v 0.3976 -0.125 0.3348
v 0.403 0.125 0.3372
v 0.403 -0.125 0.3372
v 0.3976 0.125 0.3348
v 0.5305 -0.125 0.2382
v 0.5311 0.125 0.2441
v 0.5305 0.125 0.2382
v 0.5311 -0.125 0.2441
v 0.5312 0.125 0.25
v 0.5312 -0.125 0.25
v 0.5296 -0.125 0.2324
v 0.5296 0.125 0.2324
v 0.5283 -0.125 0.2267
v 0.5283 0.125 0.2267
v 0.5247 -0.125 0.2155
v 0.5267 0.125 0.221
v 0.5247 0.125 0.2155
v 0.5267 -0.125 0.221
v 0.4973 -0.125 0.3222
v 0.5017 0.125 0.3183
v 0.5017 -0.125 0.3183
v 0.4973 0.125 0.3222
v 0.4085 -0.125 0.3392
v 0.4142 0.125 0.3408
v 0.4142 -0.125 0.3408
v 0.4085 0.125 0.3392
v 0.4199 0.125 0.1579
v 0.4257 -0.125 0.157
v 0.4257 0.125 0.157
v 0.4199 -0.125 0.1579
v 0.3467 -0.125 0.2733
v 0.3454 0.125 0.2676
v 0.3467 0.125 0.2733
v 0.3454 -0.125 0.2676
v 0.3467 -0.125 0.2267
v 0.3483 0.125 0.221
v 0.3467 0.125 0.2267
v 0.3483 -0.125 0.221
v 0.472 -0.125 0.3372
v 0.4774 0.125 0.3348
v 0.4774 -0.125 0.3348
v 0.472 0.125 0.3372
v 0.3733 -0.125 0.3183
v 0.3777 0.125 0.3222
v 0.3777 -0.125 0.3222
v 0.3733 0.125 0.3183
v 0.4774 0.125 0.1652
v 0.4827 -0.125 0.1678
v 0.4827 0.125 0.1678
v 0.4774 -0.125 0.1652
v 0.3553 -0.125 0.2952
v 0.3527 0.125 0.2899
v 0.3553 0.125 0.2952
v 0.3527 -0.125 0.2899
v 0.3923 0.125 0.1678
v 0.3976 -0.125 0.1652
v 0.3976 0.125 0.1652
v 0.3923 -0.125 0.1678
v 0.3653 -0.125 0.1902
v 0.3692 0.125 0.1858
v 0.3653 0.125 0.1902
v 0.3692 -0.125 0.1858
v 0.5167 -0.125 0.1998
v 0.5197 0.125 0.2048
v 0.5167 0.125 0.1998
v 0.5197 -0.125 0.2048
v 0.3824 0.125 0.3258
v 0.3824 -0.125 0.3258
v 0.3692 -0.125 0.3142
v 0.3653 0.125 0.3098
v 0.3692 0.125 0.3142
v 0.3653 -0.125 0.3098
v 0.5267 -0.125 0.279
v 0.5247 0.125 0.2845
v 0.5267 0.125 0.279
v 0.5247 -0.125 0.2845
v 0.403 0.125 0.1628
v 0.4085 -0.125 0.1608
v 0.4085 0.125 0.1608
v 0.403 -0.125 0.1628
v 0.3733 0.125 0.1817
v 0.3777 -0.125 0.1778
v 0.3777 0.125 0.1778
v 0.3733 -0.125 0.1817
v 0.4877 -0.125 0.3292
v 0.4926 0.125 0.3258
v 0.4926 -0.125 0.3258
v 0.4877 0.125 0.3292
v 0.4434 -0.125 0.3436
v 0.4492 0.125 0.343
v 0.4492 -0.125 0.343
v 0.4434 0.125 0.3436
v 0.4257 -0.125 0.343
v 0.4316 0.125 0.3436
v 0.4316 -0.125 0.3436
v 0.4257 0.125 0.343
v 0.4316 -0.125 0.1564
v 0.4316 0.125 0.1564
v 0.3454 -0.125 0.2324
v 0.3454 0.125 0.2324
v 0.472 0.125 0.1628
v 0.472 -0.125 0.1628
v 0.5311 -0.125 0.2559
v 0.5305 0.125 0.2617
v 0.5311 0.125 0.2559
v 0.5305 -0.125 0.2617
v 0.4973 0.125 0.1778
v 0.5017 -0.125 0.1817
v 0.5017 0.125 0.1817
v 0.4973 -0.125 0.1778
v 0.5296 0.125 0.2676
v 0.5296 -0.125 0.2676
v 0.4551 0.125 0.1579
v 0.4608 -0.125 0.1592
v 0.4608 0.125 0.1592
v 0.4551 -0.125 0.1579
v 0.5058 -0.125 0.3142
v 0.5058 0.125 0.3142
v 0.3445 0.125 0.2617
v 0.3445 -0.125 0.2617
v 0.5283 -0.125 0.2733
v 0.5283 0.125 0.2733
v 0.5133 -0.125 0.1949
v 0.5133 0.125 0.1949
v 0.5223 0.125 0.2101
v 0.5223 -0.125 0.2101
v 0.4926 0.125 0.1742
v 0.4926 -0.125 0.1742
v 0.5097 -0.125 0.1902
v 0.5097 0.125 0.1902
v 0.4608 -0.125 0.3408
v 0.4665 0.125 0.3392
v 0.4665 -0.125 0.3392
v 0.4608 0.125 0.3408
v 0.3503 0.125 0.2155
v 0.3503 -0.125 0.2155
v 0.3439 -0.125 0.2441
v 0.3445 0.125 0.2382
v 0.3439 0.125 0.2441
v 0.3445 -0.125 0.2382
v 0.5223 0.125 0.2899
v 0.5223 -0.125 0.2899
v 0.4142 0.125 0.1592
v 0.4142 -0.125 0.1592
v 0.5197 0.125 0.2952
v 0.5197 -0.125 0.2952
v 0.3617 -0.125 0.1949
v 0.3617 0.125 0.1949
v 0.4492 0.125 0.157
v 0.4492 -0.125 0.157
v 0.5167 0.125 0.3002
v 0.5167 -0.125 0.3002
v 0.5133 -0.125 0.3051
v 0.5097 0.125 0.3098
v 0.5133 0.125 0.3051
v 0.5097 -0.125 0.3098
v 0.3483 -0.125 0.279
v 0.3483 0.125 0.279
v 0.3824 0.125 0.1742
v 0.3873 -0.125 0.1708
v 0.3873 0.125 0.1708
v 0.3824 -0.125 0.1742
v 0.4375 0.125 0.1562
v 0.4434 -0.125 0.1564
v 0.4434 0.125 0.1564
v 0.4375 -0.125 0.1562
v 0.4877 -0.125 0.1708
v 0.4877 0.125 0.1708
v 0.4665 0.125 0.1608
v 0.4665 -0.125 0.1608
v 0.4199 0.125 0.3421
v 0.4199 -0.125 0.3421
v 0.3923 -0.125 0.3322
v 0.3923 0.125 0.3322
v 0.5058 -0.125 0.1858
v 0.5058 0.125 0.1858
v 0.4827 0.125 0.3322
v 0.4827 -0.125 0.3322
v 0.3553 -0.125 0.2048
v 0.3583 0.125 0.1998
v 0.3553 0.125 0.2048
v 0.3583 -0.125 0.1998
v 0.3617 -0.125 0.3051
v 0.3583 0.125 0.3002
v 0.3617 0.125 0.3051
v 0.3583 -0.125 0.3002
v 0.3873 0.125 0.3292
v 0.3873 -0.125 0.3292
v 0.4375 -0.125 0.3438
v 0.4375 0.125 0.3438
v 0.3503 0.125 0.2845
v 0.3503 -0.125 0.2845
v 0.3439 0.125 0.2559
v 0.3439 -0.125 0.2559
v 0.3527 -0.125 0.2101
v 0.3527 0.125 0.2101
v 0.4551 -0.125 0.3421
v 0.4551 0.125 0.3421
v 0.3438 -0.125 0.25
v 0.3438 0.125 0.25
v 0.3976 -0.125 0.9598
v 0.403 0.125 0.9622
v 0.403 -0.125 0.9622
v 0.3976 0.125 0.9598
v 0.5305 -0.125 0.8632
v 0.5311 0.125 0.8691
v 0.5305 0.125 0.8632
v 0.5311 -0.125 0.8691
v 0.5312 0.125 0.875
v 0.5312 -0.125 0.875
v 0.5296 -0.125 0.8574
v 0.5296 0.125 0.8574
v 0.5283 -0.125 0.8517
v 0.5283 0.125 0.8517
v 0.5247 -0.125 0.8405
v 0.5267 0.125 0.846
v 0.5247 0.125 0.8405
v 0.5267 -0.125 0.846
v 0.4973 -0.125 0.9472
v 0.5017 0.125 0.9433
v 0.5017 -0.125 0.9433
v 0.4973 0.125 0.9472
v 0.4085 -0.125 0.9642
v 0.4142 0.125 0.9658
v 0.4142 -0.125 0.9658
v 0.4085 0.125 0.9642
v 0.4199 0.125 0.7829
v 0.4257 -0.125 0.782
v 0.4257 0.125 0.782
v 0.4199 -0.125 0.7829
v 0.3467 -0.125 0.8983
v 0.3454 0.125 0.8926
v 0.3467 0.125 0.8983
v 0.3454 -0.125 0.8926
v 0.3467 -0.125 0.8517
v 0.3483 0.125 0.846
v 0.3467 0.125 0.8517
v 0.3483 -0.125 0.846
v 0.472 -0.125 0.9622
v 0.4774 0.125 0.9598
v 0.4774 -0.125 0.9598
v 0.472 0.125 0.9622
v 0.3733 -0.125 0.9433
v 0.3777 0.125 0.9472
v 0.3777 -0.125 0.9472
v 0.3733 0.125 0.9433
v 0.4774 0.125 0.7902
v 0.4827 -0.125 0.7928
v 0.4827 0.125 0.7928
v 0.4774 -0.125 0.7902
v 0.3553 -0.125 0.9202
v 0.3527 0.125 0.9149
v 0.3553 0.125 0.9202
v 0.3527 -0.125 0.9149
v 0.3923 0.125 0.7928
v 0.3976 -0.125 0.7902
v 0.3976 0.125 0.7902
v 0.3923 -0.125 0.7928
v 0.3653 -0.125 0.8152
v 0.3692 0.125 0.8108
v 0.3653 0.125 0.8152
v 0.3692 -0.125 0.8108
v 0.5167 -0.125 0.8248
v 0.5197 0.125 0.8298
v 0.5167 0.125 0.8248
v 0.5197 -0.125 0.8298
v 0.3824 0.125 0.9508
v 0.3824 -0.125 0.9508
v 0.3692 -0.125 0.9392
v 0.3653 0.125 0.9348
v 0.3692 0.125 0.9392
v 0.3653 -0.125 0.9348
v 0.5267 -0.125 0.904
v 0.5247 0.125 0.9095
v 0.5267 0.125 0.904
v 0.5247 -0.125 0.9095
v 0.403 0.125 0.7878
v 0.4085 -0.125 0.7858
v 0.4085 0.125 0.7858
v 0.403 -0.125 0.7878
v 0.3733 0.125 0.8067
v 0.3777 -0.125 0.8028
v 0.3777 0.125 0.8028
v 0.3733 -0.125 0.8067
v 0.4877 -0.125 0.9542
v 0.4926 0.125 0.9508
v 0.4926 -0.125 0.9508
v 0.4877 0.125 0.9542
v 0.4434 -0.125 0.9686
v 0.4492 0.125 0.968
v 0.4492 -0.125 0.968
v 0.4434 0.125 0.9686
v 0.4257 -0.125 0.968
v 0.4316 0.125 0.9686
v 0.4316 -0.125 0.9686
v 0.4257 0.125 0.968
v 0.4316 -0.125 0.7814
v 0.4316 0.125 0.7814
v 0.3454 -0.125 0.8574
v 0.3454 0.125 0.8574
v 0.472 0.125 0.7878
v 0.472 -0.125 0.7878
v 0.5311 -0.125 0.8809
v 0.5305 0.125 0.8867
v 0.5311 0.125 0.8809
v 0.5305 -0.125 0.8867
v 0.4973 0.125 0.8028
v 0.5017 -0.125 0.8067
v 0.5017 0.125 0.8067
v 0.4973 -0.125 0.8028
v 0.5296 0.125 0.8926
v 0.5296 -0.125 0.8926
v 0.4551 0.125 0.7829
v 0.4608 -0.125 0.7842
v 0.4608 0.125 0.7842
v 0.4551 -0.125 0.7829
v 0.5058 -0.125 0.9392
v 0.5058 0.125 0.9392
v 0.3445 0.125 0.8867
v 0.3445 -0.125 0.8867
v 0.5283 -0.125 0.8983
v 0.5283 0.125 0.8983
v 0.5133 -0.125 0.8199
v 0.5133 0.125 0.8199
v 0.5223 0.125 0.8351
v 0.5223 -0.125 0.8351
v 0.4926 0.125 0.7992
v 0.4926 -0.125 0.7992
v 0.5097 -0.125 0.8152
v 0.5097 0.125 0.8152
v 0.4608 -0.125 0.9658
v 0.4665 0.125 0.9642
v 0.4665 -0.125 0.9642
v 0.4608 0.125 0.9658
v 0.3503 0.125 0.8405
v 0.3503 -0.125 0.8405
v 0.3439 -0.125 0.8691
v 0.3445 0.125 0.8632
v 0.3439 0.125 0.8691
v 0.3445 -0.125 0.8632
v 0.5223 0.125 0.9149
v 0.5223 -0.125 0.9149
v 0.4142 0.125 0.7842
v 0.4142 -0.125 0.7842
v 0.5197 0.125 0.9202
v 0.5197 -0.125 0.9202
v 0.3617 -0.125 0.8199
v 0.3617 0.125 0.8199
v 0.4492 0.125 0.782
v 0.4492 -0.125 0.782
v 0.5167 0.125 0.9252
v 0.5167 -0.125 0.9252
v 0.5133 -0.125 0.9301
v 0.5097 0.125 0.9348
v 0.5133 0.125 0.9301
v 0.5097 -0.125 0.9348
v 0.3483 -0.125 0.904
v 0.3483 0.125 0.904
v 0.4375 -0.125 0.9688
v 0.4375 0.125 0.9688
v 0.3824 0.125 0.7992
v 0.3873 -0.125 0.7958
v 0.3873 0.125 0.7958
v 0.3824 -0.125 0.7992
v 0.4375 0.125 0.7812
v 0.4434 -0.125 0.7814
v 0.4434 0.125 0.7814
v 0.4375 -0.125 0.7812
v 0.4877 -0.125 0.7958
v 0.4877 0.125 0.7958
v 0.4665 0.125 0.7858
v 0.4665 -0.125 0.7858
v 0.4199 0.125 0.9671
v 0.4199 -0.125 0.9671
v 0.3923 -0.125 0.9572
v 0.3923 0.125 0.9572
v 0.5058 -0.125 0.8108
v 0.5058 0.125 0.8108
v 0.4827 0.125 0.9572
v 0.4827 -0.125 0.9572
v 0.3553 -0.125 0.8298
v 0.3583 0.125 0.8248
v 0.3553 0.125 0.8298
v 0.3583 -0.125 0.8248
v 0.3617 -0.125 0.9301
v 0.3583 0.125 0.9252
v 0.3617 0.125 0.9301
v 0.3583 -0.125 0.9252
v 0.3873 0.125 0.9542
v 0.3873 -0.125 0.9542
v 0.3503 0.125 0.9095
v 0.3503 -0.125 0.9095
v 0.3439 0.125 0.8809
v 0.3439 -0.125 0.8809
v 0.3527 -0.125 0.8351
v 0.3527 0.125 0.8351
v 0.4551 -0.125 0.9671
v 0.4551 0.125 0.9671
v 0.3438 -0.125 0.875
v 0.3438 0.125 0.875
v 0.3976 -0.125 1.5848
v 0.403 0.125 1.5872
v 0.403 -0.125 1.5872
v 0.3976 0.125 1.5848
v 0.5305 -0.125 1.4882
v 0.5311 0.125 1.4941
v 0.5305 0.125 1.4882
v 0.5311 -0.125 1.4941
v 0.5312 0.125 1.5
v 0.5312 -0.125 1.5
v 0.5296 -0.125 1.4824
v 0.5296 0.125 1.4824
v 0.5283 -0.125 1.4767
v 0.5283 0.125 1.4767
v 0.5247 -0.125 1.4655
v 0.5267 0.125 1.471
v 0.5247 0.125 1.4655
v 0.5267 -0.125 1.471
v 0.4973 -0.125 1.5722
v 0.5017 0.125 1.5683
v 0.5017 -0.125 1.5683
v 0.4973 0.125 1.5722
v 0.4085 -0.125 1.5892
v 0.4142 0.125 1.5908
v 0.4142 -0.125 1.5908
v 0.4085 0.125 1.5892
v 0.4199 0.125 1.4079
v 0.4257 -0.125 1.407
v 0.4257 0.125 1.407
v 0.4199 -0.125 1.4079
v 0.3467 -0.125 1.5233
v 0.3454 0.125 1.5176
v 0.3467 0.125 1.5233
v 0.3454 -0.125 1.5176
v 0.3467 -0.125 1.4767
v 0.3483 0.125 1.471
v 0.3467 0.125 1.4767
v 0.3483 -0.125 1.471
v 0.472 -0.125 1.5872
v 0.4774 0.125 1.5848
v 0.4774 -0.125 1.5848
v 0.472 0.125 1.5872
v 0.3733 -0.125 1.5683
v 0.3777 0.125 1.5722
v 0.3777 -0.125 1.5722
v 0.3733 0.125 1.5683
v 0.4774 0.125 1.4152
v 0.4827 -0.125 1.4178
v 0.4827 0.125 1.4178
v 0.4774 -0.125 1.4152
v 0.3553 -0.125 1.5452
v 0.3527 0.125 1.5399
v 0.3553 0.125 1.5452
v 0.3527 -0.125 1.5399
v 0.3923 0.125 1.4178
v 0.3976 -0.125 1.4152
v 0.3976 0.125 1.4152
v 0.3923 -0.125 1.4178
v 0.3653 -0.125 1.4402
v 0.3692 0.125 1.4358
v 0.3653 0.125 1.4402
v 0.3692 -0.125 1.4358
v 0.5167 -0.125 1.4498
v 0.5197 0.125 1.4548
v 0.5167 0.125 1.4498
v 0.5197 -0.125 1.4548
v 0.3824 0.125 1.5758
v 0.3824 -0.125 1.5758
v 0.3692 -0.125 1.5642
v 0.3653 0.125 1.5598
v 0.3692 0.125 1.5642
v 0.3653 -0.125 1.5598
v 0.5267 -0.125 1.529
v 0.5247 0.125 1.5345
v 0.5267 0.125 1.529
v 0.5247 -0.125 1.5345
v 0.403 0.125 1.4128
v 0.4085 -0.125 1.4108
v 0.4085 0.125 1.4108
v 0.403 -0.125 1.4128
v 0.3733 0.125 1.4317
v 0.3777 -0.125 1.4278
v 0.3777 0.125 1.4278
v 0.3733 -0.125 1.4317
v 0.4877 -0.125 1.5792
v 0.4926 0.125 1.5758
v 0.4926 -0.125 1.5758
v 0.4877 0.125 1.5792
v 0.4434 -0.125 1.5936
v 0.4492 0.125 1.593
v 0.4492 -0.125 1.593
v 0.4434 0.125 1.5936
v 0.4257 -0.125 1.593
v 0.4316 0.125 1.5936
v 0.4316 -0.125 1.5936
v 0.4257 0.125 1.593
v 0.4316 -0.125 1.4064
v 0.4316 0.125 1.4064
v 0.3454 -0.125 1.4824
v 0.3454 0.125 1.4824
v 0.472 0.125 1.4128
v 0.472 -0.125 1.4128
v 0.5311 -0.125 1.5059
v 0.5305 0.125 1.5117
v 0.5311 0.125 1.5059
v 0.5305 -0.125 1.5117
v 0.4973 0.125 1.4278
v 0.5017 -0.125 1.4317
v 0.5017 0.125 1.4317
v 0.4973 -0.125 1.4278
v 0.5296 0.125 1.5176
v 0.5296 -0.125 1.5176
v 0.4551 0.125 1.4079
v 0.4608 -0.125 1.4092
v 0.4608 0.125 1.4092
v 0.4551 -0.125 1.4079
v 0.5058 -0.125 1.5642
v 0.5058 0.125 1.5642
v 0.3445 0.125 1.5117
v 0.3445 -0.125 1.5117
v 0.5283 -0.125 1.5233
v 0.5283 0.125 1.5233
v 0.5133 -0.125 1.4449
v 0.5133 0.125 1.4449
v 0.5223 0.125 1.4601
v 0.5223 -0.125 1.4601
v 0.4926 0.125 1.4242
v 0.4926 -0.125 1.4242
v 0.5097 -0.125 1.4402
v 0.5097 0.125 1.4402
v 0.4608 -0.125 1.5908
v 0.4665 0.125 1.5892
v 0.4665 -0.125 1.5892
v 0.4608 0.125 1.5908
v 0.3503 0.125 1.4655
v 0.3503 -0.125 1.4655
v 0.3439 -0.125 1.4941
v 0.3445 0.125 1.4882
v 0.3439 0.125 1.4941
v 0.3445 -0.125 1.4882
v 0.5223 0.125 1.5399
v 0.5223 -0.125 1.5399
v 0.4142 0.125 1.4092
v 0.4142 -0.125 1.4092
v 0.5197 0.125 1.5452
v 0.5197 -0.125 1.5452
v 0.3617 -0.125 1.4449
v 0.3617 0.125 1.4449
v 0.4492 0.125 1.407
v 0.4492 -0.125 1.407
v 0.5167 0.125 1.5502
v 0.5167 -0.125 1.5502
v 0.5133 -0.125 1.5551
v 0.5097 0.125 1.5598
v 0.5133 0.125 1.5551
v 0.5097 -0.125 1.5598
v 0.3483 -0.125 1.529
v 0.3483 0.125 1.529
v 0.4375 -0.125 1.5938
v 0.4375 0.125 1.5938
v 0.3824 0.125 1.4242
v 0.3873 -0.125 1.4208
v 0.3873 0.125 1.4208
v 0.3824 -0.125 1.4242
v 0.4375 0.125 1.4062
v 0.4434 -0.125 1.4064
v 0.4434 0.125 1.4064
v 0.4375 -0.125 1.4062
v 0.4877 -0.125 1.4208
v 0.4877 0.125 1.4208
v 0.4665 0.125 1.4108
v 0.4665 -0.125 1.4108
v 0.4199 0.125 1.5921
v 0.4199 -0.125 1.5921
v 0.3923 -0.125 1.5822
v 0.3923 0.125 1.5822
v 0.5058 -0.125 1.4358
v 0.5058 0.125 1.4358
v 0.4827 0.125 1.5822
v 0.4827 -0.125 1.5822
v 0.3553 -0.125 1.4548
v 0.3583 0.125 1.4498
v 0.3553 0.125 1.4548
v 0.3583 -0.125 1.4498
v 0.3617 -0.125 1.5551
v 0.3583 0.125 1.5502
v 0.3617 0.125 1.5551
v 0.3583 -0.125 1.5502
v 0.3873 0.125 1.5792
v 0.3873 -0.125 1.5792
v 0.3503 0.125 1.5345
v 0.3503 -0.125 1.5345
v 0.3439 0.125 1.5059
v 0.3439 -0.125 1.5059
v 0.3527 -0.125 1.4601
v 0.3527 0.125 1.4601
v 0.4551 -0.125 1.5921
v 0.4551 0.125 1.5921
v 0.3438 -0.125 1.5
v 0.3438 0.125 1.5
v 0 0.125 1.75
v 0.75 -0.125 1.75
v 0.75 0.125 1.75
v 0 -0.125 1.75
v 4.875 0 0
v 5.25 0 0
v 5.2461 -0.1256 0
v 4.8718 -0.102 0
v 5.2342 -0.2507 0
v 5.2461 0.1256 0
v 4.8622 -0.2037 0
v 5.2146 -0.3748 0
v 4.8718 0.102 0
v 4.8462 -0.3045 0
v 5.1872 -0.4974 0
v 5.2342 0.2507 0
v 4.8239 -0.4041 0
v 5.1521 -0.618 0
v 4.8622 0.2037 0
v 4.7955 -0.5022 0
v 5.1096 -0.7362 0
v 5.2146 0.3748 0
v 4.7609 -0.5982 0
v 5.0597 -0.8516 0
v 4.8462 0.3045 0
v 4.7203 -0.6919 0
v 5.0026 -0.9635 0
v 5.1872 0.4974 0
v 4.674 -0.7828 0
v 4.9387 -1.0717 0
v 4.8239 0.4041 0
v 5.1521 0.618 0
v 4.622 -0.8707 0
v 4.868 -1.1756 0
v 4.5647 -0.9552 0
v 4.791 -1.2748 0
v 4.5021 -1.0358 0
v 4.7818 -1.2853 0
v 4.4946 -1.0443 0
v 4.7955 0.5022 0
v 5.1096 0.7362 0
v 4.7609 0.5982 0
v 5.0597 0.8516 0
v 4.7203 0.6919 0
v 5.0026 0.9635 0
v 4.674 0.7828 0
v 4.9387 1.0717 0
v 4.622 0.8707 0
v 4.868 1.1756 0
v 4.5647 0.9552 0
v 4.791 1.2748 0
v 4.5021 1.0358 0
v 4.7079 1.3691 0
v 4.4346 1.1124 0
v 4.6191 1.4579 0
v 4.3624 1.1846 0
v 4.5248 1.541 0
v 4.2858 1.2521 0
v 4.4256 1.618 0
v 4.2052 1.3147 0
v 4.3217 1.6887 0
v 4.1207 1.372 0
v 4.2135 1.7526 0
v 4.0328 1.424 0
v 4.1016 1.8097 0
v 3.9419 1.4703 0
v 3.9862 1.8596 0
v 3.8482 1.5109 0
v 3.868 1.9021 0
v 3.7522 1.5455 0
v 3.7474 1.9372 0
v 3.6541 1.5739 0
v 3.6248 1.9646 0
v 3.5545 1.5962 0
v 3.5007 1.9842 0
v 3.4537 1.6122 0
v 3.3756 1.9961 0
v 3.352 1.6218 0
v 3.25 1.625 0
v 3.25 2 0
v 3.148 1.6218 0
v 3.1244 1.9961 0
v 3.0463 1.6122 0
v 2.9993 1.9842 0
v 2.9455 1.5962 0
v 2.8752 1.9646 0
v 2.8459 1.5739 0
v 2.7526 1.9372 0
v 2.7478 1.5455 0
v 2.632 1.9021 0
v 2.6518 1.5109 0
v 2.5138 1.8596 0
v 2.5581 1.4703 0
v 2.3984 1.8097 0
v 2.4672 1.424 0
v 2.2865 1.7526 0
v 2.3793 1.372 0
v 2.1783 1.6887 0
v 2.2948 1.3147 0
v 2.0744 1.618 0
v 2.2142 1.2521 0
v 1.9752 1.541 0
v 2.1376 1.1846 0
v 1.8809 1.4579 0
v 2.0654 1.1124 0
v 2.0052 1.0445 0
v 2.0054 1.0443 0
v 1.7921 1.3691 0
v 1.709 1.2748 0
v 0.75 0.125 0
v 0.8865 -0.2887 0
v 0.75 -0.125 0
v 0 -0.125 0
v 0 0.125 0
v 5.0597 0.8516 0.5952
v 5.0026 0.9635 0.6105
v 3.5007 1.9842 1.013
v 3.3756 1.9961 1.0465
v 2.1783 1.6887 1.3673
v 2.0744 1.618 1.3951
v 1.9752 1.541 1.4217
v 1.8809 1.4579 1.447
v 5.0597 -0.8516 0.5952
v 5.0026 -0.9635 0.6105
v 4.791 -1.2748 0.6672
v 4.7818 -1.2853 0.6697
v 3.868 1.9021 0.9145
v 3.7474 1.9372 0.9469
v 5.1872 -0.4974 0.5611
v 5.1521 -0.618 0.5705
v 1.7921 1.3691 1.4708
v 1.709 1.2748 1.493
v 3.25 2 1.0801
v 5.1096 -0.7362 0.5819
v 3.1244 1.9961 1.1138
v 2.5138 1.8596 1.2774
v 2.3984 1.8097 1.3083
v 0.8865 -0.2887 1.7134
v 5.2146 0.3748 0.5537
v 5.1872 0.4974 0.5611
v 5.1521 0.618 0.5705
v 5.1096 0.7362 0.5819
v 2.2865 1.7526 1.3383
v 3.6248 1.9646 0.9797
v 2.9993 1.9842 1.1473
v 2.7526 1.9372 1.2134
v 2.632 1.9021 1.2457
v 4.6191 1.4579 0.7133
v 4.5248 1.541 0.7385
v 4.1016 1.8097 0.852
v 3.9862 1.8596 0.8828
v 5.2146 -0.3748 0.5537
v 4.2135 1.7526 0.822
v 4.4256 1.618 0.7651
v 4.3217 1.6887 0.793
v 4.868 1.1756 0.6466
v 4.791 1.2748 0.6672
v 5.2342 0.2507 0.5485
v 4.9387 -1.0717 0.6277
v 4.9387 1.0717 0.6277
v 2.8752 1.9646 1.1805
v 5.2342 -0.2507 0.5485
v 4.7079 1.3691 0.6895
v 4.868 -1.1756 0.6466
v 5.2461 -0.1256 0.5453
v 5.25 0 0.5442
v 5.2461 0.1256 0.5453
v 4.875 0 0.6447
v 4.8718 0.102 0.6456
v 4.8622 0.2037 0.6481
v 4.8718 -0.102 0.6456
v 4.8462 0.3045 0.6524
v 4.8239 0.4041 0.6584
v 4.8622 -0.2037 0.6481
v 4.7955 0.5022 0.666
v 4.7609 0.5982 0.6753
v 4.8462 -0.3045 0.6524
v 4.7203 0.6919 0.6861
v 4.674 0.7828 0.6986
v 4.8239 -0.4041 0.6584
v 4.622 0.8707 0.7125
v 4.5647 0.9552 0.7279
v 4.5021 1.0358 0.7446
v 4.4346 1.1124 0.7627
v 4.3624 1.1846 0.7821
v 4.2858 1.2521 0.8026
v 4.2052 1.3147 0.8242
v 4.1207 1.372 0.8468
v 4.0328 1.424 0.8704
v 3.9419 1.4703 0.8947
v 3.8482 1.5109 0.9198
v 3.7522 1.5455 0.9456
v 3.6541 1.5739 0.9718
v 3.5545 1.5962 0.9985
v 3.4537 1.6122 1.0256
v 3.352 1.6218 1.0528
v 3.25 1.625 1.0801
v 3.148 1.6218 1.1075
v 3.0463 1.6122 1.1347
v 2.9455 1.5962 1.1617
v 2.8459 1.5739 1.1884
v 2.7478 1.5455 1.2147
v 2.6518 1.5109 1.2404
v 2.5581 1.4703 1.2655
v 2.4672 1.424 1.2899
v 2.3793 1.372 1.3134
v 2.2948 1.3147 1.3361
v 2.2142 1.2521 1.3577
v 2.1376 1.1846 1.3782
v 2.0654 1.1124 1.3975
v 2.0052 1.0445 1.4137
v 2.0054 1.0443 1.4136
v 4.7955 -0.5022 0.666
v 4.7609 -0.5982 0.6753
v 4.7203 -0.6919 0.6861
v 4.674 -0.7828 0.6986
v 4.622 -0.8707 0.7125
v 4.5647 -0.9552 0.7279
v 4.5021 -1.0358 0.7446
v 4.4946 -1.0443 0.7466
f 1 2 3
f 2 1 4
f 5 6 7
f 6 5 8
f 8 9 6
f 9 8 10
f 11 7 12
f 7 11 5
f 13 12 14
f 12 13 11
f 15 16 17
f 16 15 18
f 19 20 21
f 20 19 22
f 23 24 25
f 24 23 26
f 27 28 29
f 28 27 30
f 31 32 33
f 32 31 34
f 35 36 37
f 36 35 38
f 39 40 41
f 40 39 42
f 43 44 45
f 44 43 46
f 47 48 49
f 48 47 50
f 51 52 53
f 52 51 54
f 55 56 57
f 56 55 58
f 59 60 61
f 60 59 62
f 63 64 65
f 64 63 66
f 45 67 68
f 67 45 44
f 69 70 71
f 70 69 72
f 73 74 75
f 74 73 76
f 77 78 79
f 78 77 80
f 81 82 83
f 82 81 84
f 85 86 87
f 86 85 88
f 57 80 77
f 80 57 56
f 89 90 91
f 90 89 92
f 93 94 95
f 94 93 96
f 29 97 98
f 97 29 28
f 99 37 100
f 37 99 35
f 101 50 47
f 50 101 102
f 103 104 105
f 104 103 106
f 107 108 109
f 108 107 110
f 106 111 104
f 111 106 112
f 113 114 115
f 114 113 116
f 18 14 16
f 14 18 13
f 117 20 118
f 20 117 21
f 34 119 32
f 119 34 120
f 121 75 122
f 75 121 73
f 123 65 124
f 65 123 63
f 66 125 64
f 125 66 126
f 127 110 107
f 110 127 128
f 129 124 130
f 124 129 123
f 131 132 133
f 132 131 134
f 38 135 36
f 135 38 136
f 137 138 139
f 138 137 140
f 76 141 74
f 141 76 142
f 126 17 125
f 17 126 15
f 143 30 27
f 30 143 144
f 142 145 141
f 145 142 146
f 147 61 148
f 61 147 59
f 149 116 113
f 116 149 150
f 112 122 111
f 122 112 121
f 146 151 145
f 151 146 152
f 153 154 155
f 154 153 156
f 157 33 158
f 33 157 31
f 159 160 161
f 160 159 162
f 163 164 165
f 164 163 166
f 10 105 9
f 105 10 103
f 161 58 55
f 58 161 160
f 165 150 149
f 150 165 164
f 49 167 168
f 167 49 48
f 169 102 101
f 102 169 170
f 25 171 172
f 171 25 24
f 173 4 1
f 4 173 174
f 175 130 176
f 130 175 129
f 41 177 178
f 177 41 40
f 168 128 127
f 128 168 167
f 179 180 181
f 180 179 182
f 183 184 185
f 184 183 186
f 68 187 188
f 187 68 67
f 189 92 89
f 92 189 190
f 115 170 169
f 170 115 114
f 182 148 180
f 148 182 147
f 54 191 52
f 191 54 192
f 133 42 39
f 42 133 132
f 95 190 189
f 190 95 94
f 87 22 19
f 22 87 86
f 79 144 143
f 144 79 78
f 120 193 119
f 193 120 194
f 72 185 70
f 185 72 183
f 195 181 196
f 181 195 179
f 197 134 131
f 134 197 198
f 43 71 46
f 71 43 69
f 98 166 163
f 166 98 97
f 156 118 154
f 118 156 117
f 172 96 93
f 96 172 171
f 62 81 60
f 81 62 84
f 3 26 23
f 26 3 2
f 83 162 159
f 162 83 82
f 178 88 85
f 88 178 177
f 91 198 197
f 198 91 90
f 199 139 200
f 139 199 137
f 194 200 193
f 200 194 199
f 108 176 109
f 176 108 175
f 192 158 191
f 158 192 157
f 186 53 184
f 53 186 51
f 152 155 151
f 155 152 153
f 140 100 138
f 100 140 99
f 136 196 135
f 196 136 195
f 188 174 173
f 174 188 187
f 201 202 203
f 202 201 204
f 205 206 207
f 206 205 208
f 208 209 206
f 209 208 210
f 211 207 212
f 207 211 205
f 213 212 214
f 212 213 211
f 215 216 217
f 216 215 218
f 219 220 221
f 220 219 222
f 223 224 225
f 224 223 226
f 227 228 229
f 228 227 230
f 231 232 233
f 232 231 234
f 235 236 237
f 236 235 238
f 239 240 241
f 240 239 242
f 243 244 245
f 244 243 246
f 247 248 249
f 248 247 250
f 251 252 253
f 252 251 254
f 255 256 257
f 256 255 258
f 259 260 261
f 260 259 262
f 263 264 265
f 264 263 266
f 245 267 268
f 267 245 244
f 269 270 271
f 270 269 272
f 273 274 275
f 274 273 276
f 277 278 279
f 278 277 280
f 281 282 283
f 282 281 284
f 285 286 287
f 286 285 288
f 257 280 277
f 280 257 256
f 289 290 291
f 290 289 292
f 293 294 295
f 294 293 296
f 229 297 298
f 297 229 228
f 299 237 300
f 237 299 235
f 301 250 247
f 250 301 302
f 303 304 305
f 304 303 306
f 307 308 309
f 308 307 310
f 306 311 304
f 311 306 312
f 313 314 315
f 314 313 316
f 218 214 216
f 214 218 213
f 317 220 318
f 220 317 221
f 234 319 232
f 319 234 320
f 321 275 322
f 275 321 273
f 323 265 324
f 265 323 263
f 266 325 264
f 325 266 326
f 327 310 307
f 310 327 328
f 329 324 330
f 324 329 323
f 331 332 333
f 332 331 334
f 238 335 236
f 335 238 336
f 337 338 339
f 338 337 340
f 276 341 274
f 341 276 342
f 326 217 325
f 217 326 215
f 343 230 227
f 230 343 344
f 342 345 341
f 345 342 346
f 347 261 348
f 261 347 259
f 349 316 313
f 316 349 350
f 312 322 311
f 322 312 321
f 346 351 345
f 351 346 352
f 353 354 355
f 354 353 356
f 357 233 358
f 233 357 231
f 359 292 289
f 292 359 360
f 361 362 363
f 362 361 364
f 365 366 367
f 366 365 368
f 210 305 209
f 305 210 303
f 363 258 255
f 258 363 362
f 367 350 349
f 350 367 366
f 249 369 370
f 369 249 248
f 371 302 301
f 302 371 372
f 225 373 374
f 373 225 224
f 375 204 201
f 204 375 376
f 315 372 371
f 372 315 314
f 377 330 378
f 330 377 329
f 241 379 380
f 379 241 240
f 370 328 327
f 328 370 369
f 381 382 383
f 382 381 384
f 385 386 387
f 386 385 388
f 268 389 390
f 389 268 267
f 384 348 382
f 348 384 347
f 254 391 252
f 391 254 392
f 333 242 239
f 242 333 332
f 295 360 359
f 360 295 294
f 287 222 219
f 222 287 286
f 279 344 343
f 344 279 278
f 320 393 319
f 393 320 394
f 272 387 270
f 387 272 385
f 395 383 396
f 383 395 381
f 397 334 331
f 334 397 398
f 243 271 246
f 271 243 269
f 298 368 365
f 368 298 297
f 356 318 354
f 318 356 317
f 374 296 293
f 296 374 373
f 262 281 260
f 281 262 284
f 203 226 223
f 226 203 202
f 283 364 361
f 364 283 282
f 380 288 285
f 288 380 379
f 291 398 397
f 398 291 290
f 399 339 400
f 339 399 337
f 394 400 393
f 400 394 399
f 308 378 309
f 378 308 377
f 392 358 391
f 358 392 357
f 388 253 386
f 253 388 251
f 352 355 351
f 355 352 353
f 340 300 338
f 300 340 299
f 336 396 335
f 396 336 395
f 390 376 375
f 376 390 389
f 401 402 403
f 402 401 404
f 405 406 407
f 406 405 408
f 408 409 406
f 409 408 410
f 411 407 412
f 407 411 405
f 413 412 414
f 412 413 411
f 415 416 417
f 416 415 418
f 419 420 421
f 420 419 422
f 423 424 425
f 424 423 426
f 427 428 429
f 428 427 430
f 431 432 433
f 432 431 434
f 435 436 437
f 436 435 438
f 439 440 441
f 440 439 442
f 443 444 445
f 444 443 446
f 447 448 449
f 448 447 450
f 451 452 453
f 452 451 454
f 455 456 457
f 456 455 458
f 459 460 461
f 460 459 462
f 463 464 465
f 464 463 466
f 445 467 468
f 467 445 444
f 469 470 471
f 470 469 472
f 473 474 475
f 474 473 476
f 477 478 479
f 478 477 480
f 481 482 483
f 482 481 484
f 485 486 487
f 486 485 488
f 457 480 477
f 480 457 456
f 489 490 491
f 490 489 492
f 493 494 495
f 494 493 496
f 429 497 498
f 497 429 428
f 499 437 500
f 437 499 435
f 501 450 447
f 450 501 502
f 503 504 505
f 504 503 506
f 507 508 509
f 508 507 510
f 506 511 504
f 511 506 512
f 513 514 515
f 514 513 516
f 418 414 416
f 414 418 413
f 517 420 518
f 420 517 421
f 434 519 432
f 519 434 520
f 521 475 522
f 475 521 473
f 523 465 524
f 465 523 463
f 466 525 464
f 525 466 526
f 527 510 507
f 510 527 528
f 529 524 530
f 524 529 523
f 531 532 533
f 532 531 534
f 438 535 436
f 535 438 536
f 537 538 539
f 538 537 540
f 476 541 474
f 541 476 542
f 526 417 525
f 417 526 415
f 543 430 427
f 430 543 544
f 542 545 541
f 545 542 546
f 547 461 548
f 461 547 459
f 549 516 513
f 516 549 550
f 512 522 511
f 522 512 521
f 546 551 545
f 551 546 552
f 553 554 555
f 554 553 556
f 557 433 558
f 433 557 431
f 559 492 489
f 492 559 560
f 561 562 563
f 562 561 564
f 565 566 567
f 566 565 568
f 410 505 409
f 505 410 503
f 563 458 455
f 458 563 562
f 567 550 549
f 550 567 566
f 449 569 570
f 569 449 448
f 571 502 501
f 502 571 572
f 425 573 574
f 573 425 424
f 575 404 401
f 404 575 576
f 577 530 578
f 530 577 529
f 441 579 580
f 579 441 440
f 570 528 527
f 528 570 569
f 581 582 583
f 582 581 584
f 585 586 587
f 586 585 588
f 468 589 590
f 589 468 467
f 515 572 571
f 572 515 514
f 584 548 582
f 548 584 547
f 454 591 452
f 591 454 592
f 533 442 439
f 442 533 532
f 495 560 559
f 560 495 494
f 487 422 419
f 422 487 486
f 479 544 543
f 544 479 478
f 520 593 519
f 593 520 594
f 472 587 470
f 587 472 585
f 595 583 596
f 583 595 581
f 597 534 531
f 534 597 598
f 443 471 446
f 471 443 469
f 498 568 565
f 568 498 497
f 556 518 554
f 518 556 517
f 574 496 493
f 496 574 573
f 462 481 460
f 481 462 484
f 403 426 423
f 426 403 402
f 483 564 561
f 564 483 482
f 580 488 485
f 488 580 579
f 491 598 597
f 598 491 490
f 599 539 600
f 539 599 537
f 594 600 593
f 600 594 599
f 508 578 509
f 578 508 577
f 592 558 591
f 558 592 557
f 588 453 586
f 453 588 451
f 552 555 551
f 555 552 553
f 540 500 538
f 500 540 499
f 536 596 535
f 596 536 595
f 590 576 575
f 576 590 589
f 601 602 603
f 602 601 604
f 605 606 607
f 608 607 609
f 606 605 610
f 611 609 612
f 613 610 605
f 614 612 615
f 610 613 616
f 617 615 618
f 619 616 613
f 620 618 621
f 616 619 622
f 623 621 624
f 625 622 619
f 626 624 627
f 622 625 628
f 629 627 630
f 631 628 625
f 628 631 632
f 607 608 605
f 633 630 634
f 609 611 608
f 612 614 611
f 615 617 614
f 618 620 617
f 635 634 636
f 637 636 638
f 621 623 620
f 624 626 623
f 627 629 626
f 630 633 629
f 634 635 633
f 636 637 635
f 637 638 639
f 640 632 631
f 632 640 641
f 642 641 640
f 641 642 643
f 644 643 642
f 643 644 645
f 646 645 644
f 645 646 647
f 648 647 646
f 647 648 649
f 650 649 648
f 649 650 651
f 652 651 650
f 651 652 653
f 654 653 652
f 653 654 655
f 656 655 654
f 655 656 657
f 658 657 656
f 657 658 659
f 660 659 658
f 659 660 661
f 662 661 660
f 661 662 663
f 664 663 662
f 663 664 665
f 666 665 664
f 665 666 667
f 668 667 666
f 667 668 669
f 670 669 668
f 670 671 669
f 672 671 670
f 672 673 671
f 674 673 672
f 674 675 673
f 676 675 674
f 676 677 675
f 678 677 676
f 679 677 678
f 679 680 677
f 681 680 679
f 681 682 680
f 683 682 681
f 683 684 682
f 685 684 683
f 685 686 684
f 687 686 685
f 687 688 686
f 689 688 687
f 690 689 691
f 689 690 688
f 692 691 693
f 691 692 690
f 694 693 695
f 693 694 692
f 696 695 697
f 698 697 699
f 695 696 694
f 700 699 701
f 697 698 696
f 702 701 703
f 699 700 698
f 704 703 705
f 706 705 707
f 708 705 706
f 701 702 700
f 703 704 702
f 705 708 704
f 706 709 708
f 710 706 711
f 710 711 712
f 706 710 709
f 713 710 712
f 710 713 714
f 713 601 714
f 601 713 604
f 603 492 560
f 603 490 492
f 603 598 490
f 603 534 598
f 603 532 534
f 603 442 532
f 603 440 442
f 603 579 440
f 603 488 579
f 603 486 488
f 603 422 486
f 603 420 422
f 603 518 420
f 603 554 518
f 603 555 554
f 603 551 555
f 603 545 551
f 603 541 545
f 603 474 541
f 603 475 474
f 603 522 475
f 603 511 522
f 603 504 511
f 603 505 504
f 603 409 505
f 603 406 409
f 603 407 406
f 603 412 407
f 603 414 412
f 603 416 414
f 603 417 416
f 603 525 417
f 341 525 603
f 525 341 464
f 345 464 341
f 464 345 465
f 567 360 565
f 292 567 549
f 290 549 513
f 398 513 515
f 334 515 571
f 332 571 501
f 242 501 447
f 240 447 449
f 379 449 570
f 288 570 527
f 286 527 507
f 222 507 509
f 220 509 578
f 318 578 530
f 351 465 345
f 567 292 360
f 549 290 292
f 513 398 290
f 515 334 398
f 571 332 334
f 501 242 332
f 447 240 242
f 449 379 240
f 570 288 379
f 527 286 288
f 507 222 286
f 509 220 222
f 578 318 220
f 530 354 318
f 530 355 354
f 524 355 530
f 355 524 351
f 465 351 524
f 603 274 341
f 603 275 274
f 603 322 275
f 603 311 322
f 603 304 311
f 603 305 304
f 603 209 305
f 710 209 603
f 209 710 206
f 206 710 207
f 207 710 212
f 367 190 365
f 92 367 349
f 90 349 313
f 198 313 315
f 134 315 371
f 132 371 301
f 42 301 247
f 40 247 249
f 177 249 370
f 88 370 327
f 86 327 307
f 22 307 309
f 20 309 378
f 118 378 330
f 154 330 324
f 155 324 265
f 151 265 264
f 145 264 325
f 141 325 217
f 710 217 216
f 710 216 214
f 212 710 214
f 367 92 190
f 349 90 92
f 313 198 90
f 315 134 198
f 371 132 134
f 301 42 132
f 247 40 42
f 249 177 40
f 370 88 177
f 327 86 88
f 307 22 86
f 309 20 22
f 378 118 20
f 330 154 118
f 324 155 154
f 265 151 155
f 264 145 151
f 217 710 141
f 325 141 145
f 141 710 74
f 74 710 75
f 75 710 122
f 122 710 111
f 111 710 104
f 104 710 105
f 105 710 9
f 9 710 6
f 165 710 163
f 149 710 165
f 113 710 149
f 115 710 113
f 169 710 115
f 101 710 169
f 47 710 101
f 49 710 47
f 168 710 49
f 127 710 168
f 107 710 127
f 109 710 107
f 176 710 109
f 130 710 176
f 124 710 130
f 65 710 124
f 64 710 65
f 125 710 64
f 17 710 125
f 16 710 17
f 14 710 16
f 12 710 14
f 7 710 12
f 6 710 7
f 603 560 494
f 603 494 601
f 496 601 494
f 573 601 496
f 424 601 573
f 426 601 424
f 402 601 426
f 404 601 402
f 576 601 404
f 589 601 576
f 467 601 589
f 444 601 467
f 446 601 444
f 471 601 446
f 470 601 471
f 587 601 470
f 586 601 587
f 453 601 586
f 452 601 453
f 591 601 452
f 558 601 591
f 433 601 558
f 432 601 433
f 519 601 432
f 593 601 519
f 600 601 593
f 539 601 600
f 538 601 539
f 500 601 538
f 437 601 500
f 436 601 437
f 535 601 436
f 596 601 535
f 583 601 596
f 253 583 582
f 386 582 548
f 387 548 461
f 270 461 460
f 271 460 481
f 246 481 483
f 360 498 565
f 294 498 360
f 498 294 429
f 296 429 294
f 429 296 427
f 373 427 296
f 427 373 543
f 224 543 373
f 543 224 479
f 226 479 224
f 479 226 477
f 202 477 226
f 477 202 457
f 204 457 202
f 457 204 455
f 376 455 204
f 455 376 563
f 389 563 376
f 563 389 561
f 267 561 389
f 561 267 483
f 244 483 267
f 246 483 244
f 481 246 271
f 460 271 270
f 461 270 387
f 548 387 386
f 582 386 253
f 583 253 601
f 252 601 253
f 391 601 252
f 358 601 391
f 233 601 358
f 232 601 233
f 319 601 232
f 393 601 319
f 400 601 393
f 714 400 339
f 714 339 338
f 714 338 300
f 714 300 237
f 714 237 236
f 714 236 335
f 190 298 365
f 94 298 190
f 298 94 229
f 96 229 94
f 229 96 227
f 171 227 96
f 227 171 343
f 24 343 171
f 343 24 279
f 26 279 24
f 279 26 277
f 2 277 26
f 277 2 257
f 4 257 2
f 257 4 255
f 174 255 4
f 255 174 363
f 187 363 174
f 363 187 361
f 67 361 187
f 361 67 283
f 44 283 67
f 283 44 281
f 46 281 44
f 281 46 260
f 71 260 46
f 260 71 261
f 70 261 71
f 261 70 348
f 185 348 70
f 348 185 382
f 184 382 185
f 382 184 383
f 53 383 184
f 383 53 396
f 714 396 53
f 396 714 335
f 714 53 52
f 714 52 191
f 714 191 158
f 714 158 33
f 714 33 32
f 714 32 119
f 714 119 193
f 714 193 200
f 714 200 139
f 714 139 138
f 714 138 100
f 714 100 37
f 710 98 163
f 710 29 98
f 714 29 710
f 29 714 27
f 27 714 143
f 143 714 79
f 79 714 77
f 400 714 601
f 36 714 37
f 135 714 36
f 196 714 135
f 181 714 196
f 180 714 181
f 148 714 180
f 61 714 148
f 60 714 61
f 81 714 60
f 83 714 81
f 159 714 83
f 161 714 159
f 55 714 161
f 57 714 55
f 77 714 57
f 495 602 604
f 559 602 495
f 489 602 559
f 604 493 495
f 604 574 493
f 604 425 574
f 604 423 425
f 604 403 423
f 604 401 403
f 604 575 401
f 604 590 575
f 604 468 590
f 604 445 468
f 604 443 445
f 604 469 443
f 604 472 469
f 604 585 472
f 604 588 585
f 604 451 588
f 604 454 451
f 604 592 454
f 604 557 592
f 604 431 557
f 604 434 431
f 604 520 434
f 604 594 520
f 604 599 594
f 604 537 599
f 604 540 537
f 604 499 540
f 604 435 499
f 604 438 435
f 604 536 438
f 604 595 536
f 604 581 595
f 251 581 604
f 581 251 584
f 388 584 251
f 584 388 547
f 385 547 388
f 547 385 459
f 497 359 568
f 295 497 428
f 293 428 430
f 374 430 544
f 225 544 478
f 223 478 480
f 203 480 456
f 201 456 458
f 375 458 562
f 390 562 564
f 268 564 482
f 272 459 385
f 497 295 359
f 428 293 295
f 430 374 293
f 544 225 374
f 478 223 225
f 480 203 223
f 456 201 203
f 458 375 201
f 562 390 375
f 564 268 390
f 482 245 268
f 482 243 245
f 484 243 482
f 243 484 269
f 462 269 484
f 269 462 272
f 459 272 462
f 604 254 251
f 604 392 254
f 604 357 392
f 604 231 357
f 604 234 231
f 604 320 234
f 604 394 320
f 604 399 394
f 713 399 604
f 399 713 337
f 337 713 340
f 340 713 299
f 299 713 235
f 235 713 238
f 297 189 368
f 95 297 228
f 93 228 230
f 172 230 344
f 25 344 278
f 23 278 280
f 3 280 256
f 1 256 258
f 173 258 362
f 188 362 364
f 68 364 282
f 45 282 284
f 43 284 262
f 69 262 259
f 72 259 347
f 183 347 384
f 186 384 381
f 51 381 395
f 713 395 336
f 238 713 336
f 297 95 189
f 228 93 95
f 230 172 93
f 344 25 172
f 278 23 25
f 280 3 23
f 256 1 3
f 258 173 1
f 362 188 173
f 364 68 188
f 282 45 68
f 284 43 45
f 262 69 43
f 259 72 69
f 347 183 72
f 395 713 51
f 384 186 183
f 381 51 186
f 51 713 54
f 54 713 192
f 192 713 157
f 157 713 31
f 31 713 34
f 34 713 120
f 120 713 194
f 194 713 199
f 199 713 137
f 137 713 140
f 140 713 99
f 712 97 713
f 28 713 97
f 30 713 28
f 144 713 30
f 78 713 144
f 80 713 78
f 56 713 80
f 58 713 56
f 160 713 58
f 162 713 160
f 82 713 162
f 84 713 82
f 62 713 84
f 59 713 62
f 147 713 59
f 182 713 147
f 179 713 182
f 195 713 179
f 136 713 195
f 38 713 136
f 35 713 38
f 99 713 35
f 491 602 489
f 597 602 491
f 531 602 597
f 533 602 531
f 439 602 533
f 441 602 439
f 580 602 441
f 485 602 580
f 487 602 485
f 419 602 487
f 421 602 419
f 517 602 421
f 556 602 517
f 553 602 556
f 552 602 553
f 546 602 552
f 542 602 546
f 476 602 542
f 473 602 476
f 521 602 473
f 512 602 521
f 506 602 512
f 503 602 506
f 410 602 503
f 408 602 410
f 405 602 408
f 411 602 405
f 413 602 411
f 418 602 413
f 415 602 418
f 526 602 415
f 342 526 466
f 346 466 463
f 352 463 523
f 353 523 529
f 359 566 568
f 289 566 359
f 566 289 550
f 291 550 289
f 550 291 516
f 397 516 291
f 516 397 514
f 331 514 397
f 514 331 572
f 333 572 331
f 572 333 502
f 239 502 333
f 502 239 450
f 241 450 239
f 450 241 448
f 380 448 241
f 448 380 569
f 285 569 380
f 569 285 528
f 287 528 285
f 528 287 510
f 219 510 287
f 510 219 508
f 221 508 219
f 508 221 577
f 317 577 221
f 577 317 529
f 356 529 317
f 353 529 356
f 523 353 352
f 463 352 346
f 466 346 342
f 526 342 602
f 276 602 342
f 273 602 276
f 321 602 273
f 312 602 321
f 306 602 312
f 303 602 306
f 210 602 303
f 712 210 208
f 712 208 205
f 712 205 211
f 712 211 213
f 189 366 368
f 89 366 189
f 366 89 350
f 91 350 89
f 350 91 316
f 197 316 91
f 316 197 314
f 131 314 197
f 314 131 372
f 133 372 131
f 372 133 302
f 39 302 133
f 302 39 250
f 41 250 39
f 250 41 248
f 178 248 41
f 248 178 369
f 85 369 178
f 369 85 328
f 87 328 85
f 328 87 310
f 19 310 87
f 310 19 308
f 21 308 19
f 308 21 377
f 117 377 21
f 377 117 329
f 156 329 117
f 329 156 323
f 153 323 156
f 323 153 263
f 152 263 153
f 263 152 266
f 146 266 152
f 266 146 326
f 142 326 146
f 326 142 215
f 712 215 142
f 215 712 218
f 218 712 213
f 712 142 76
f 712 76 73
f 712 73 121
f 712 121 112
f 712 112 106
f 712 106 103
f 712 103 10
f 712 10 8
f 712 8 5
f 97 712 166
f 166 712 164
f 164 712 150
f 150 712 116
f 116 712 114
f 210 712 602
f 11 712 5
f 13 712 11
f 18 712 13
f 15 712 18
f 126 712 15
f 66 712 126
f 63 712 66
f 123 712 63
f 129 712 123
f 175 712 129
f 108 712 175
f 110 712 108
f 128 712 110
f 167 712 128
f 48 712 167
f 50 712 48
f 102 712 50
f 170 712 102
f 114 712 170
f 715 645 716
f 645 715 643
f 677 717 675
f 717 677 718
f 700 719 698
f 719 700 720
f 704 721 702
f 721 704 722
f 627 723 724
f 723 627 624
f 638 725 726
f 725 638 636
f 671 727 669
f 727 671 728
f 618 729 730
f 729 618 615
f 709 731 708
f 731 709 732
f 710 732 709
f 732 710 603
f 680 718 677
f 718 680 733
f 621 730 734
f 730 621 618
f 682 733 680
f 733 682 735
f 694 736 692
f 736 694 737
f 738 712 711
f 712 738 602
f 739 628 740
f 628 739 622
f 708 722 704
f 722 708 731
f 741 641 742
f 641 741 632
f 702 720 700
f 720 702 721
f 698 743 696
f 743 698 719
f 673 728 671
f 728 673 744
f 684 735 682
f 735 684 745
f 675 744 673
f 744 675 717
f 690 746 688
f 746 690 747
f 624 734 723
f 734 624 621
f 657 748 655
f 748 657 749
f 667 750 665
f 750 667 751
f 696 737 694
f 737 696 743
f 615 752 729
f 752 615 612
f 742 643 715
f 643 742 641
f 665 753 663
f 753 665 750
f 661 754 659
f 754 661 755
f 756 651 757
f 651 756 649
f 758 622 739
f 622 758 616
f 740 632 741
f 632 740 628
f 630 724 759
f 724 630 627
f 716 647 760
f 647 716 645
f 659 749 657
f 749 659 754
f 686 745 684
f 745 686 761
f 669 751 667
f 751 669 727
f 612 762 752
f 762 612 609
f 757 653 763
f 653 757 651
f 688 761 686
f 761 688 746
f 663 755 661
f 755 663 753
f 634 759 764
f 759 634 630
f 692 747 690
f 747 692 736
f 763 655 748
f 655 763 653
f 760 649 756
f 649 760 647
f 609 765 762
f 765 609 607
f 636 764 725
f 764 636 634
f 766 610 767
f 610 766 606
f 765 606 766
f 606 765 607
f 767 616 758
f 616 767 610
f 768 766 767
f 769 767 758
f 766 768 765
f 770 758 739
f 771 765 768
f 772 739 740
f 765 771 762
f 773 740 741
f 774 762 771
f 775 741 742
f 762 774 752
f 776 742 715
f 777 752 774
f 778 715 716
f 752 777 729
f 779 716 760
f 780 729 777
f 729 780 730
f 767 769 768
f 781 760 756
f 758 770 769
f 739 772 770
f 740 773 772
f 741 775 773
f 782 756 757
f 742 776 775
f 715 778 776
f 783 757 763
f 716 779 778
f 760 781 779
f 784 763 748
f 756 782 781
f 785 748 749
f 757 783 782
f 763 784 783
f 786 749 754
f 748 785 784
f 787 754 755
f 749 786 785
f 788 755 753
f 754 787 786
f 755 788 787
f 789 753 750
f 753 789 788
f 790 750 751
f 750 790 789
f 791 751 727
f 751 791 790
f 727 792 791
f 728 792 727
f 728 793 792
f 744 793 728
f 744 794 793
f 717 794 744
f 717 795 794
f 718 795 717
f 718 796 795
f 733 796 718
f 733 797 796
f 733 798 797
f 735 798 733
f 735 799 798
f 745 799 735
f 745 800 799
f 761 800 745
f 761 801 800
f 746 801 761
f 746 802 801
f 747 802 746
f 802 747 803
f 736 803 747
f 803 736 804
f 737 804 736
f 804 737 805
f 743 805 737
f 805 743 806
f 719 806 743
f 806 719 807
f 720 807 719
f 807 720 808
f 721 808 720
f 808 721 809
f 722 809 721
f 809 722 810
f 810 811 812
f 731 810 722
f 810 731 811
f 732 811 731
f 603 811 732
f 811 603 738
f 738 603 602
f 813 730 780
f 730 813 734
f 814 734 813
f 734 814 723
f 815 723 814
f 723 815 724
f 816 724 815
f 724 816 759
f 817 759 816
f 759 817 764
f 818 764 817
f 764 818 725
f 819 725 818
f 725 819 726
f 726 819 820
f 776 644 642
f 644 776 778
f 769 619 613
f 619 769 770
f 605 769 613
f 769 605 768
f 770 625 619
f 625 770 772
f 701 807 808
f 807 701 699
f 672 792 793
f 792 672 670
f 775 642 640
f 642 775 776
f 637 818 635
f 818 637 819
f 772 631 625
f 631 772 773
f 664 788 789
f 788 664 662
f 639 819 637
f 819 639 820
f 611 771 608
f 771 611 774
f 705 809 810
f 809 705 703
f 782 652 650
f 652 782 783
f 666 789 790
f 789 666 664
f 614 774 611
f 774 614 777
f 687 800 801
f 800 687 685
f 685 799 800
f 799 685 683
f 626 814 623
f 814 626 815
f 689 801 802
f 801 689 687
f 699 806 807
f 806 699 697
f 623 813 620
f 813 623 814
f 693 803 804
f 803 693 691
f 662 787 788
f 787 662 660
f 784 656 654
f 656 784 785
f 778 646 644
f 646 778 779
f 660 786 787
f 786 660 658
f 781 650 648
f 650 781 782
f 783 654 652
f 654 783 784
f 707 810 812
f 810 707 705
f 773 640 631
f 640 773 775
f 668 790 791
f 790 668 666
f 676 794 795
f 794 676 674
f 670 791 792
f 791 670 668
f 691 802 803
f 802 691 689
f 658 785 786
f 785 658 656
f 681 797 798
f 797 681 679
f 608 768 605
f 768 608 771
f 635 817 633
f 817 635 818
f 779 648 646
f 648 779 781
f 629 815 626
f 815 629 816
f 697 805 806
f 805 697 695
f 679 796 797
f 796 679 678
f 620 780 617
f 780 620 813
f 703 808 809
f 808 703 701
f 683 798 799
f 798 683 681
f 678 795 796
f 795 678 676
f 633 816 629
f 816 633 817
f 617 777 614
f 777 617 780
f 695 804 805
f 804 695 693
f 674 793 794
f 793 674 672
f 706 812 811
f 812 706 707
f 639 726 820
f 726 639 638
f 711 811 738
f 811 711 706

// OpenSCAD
boltRad = 1.5/16;
$fn=100;

ext = .3125 + .5-(1/16);

sweepRad = 2;

color([1,0,0]) translate([0,-0.125]) difference() {
     cube([ext,0.25,1.75]);


    for (i=[0.25,0.875,1.5]) {
                translate([.5-(1/16),-5,i]) rotate([-90,0,0]) cylinder(r=boltRad,h=10);
    }
}

pushout = 2.5 - sweepRad;
sweepAngle = 15;
wall = 0.375;

cutoffAngle = 40;
cutoffWidth = 4;

translate([ext+sweepRad,0]) difference() {
    hull() {
        color([0,1,0]) translate([-sweepRad,-0.125,0]) cube([0.5,0.25,1.75]);
        translate([pushout,0]) cylinder(r=sweepRad,h=1.75);
    }
    
    translate([-sweepRad,0,1.75]) rotate([0,sweepAngle,0]) cylinder(r=10,h=10);
    
            translate([pushout,0,-1]) cylinder(r=sweepRad-wall,h=5);

    translate([pushout - (sweepRad-wall)*cos(cutoffAngle),(sweepRad-wall)*sin(cutoffAngle),-1]) rotate(-90-cutoffAngle) cube([10,cutoffWidth,10]);


}
